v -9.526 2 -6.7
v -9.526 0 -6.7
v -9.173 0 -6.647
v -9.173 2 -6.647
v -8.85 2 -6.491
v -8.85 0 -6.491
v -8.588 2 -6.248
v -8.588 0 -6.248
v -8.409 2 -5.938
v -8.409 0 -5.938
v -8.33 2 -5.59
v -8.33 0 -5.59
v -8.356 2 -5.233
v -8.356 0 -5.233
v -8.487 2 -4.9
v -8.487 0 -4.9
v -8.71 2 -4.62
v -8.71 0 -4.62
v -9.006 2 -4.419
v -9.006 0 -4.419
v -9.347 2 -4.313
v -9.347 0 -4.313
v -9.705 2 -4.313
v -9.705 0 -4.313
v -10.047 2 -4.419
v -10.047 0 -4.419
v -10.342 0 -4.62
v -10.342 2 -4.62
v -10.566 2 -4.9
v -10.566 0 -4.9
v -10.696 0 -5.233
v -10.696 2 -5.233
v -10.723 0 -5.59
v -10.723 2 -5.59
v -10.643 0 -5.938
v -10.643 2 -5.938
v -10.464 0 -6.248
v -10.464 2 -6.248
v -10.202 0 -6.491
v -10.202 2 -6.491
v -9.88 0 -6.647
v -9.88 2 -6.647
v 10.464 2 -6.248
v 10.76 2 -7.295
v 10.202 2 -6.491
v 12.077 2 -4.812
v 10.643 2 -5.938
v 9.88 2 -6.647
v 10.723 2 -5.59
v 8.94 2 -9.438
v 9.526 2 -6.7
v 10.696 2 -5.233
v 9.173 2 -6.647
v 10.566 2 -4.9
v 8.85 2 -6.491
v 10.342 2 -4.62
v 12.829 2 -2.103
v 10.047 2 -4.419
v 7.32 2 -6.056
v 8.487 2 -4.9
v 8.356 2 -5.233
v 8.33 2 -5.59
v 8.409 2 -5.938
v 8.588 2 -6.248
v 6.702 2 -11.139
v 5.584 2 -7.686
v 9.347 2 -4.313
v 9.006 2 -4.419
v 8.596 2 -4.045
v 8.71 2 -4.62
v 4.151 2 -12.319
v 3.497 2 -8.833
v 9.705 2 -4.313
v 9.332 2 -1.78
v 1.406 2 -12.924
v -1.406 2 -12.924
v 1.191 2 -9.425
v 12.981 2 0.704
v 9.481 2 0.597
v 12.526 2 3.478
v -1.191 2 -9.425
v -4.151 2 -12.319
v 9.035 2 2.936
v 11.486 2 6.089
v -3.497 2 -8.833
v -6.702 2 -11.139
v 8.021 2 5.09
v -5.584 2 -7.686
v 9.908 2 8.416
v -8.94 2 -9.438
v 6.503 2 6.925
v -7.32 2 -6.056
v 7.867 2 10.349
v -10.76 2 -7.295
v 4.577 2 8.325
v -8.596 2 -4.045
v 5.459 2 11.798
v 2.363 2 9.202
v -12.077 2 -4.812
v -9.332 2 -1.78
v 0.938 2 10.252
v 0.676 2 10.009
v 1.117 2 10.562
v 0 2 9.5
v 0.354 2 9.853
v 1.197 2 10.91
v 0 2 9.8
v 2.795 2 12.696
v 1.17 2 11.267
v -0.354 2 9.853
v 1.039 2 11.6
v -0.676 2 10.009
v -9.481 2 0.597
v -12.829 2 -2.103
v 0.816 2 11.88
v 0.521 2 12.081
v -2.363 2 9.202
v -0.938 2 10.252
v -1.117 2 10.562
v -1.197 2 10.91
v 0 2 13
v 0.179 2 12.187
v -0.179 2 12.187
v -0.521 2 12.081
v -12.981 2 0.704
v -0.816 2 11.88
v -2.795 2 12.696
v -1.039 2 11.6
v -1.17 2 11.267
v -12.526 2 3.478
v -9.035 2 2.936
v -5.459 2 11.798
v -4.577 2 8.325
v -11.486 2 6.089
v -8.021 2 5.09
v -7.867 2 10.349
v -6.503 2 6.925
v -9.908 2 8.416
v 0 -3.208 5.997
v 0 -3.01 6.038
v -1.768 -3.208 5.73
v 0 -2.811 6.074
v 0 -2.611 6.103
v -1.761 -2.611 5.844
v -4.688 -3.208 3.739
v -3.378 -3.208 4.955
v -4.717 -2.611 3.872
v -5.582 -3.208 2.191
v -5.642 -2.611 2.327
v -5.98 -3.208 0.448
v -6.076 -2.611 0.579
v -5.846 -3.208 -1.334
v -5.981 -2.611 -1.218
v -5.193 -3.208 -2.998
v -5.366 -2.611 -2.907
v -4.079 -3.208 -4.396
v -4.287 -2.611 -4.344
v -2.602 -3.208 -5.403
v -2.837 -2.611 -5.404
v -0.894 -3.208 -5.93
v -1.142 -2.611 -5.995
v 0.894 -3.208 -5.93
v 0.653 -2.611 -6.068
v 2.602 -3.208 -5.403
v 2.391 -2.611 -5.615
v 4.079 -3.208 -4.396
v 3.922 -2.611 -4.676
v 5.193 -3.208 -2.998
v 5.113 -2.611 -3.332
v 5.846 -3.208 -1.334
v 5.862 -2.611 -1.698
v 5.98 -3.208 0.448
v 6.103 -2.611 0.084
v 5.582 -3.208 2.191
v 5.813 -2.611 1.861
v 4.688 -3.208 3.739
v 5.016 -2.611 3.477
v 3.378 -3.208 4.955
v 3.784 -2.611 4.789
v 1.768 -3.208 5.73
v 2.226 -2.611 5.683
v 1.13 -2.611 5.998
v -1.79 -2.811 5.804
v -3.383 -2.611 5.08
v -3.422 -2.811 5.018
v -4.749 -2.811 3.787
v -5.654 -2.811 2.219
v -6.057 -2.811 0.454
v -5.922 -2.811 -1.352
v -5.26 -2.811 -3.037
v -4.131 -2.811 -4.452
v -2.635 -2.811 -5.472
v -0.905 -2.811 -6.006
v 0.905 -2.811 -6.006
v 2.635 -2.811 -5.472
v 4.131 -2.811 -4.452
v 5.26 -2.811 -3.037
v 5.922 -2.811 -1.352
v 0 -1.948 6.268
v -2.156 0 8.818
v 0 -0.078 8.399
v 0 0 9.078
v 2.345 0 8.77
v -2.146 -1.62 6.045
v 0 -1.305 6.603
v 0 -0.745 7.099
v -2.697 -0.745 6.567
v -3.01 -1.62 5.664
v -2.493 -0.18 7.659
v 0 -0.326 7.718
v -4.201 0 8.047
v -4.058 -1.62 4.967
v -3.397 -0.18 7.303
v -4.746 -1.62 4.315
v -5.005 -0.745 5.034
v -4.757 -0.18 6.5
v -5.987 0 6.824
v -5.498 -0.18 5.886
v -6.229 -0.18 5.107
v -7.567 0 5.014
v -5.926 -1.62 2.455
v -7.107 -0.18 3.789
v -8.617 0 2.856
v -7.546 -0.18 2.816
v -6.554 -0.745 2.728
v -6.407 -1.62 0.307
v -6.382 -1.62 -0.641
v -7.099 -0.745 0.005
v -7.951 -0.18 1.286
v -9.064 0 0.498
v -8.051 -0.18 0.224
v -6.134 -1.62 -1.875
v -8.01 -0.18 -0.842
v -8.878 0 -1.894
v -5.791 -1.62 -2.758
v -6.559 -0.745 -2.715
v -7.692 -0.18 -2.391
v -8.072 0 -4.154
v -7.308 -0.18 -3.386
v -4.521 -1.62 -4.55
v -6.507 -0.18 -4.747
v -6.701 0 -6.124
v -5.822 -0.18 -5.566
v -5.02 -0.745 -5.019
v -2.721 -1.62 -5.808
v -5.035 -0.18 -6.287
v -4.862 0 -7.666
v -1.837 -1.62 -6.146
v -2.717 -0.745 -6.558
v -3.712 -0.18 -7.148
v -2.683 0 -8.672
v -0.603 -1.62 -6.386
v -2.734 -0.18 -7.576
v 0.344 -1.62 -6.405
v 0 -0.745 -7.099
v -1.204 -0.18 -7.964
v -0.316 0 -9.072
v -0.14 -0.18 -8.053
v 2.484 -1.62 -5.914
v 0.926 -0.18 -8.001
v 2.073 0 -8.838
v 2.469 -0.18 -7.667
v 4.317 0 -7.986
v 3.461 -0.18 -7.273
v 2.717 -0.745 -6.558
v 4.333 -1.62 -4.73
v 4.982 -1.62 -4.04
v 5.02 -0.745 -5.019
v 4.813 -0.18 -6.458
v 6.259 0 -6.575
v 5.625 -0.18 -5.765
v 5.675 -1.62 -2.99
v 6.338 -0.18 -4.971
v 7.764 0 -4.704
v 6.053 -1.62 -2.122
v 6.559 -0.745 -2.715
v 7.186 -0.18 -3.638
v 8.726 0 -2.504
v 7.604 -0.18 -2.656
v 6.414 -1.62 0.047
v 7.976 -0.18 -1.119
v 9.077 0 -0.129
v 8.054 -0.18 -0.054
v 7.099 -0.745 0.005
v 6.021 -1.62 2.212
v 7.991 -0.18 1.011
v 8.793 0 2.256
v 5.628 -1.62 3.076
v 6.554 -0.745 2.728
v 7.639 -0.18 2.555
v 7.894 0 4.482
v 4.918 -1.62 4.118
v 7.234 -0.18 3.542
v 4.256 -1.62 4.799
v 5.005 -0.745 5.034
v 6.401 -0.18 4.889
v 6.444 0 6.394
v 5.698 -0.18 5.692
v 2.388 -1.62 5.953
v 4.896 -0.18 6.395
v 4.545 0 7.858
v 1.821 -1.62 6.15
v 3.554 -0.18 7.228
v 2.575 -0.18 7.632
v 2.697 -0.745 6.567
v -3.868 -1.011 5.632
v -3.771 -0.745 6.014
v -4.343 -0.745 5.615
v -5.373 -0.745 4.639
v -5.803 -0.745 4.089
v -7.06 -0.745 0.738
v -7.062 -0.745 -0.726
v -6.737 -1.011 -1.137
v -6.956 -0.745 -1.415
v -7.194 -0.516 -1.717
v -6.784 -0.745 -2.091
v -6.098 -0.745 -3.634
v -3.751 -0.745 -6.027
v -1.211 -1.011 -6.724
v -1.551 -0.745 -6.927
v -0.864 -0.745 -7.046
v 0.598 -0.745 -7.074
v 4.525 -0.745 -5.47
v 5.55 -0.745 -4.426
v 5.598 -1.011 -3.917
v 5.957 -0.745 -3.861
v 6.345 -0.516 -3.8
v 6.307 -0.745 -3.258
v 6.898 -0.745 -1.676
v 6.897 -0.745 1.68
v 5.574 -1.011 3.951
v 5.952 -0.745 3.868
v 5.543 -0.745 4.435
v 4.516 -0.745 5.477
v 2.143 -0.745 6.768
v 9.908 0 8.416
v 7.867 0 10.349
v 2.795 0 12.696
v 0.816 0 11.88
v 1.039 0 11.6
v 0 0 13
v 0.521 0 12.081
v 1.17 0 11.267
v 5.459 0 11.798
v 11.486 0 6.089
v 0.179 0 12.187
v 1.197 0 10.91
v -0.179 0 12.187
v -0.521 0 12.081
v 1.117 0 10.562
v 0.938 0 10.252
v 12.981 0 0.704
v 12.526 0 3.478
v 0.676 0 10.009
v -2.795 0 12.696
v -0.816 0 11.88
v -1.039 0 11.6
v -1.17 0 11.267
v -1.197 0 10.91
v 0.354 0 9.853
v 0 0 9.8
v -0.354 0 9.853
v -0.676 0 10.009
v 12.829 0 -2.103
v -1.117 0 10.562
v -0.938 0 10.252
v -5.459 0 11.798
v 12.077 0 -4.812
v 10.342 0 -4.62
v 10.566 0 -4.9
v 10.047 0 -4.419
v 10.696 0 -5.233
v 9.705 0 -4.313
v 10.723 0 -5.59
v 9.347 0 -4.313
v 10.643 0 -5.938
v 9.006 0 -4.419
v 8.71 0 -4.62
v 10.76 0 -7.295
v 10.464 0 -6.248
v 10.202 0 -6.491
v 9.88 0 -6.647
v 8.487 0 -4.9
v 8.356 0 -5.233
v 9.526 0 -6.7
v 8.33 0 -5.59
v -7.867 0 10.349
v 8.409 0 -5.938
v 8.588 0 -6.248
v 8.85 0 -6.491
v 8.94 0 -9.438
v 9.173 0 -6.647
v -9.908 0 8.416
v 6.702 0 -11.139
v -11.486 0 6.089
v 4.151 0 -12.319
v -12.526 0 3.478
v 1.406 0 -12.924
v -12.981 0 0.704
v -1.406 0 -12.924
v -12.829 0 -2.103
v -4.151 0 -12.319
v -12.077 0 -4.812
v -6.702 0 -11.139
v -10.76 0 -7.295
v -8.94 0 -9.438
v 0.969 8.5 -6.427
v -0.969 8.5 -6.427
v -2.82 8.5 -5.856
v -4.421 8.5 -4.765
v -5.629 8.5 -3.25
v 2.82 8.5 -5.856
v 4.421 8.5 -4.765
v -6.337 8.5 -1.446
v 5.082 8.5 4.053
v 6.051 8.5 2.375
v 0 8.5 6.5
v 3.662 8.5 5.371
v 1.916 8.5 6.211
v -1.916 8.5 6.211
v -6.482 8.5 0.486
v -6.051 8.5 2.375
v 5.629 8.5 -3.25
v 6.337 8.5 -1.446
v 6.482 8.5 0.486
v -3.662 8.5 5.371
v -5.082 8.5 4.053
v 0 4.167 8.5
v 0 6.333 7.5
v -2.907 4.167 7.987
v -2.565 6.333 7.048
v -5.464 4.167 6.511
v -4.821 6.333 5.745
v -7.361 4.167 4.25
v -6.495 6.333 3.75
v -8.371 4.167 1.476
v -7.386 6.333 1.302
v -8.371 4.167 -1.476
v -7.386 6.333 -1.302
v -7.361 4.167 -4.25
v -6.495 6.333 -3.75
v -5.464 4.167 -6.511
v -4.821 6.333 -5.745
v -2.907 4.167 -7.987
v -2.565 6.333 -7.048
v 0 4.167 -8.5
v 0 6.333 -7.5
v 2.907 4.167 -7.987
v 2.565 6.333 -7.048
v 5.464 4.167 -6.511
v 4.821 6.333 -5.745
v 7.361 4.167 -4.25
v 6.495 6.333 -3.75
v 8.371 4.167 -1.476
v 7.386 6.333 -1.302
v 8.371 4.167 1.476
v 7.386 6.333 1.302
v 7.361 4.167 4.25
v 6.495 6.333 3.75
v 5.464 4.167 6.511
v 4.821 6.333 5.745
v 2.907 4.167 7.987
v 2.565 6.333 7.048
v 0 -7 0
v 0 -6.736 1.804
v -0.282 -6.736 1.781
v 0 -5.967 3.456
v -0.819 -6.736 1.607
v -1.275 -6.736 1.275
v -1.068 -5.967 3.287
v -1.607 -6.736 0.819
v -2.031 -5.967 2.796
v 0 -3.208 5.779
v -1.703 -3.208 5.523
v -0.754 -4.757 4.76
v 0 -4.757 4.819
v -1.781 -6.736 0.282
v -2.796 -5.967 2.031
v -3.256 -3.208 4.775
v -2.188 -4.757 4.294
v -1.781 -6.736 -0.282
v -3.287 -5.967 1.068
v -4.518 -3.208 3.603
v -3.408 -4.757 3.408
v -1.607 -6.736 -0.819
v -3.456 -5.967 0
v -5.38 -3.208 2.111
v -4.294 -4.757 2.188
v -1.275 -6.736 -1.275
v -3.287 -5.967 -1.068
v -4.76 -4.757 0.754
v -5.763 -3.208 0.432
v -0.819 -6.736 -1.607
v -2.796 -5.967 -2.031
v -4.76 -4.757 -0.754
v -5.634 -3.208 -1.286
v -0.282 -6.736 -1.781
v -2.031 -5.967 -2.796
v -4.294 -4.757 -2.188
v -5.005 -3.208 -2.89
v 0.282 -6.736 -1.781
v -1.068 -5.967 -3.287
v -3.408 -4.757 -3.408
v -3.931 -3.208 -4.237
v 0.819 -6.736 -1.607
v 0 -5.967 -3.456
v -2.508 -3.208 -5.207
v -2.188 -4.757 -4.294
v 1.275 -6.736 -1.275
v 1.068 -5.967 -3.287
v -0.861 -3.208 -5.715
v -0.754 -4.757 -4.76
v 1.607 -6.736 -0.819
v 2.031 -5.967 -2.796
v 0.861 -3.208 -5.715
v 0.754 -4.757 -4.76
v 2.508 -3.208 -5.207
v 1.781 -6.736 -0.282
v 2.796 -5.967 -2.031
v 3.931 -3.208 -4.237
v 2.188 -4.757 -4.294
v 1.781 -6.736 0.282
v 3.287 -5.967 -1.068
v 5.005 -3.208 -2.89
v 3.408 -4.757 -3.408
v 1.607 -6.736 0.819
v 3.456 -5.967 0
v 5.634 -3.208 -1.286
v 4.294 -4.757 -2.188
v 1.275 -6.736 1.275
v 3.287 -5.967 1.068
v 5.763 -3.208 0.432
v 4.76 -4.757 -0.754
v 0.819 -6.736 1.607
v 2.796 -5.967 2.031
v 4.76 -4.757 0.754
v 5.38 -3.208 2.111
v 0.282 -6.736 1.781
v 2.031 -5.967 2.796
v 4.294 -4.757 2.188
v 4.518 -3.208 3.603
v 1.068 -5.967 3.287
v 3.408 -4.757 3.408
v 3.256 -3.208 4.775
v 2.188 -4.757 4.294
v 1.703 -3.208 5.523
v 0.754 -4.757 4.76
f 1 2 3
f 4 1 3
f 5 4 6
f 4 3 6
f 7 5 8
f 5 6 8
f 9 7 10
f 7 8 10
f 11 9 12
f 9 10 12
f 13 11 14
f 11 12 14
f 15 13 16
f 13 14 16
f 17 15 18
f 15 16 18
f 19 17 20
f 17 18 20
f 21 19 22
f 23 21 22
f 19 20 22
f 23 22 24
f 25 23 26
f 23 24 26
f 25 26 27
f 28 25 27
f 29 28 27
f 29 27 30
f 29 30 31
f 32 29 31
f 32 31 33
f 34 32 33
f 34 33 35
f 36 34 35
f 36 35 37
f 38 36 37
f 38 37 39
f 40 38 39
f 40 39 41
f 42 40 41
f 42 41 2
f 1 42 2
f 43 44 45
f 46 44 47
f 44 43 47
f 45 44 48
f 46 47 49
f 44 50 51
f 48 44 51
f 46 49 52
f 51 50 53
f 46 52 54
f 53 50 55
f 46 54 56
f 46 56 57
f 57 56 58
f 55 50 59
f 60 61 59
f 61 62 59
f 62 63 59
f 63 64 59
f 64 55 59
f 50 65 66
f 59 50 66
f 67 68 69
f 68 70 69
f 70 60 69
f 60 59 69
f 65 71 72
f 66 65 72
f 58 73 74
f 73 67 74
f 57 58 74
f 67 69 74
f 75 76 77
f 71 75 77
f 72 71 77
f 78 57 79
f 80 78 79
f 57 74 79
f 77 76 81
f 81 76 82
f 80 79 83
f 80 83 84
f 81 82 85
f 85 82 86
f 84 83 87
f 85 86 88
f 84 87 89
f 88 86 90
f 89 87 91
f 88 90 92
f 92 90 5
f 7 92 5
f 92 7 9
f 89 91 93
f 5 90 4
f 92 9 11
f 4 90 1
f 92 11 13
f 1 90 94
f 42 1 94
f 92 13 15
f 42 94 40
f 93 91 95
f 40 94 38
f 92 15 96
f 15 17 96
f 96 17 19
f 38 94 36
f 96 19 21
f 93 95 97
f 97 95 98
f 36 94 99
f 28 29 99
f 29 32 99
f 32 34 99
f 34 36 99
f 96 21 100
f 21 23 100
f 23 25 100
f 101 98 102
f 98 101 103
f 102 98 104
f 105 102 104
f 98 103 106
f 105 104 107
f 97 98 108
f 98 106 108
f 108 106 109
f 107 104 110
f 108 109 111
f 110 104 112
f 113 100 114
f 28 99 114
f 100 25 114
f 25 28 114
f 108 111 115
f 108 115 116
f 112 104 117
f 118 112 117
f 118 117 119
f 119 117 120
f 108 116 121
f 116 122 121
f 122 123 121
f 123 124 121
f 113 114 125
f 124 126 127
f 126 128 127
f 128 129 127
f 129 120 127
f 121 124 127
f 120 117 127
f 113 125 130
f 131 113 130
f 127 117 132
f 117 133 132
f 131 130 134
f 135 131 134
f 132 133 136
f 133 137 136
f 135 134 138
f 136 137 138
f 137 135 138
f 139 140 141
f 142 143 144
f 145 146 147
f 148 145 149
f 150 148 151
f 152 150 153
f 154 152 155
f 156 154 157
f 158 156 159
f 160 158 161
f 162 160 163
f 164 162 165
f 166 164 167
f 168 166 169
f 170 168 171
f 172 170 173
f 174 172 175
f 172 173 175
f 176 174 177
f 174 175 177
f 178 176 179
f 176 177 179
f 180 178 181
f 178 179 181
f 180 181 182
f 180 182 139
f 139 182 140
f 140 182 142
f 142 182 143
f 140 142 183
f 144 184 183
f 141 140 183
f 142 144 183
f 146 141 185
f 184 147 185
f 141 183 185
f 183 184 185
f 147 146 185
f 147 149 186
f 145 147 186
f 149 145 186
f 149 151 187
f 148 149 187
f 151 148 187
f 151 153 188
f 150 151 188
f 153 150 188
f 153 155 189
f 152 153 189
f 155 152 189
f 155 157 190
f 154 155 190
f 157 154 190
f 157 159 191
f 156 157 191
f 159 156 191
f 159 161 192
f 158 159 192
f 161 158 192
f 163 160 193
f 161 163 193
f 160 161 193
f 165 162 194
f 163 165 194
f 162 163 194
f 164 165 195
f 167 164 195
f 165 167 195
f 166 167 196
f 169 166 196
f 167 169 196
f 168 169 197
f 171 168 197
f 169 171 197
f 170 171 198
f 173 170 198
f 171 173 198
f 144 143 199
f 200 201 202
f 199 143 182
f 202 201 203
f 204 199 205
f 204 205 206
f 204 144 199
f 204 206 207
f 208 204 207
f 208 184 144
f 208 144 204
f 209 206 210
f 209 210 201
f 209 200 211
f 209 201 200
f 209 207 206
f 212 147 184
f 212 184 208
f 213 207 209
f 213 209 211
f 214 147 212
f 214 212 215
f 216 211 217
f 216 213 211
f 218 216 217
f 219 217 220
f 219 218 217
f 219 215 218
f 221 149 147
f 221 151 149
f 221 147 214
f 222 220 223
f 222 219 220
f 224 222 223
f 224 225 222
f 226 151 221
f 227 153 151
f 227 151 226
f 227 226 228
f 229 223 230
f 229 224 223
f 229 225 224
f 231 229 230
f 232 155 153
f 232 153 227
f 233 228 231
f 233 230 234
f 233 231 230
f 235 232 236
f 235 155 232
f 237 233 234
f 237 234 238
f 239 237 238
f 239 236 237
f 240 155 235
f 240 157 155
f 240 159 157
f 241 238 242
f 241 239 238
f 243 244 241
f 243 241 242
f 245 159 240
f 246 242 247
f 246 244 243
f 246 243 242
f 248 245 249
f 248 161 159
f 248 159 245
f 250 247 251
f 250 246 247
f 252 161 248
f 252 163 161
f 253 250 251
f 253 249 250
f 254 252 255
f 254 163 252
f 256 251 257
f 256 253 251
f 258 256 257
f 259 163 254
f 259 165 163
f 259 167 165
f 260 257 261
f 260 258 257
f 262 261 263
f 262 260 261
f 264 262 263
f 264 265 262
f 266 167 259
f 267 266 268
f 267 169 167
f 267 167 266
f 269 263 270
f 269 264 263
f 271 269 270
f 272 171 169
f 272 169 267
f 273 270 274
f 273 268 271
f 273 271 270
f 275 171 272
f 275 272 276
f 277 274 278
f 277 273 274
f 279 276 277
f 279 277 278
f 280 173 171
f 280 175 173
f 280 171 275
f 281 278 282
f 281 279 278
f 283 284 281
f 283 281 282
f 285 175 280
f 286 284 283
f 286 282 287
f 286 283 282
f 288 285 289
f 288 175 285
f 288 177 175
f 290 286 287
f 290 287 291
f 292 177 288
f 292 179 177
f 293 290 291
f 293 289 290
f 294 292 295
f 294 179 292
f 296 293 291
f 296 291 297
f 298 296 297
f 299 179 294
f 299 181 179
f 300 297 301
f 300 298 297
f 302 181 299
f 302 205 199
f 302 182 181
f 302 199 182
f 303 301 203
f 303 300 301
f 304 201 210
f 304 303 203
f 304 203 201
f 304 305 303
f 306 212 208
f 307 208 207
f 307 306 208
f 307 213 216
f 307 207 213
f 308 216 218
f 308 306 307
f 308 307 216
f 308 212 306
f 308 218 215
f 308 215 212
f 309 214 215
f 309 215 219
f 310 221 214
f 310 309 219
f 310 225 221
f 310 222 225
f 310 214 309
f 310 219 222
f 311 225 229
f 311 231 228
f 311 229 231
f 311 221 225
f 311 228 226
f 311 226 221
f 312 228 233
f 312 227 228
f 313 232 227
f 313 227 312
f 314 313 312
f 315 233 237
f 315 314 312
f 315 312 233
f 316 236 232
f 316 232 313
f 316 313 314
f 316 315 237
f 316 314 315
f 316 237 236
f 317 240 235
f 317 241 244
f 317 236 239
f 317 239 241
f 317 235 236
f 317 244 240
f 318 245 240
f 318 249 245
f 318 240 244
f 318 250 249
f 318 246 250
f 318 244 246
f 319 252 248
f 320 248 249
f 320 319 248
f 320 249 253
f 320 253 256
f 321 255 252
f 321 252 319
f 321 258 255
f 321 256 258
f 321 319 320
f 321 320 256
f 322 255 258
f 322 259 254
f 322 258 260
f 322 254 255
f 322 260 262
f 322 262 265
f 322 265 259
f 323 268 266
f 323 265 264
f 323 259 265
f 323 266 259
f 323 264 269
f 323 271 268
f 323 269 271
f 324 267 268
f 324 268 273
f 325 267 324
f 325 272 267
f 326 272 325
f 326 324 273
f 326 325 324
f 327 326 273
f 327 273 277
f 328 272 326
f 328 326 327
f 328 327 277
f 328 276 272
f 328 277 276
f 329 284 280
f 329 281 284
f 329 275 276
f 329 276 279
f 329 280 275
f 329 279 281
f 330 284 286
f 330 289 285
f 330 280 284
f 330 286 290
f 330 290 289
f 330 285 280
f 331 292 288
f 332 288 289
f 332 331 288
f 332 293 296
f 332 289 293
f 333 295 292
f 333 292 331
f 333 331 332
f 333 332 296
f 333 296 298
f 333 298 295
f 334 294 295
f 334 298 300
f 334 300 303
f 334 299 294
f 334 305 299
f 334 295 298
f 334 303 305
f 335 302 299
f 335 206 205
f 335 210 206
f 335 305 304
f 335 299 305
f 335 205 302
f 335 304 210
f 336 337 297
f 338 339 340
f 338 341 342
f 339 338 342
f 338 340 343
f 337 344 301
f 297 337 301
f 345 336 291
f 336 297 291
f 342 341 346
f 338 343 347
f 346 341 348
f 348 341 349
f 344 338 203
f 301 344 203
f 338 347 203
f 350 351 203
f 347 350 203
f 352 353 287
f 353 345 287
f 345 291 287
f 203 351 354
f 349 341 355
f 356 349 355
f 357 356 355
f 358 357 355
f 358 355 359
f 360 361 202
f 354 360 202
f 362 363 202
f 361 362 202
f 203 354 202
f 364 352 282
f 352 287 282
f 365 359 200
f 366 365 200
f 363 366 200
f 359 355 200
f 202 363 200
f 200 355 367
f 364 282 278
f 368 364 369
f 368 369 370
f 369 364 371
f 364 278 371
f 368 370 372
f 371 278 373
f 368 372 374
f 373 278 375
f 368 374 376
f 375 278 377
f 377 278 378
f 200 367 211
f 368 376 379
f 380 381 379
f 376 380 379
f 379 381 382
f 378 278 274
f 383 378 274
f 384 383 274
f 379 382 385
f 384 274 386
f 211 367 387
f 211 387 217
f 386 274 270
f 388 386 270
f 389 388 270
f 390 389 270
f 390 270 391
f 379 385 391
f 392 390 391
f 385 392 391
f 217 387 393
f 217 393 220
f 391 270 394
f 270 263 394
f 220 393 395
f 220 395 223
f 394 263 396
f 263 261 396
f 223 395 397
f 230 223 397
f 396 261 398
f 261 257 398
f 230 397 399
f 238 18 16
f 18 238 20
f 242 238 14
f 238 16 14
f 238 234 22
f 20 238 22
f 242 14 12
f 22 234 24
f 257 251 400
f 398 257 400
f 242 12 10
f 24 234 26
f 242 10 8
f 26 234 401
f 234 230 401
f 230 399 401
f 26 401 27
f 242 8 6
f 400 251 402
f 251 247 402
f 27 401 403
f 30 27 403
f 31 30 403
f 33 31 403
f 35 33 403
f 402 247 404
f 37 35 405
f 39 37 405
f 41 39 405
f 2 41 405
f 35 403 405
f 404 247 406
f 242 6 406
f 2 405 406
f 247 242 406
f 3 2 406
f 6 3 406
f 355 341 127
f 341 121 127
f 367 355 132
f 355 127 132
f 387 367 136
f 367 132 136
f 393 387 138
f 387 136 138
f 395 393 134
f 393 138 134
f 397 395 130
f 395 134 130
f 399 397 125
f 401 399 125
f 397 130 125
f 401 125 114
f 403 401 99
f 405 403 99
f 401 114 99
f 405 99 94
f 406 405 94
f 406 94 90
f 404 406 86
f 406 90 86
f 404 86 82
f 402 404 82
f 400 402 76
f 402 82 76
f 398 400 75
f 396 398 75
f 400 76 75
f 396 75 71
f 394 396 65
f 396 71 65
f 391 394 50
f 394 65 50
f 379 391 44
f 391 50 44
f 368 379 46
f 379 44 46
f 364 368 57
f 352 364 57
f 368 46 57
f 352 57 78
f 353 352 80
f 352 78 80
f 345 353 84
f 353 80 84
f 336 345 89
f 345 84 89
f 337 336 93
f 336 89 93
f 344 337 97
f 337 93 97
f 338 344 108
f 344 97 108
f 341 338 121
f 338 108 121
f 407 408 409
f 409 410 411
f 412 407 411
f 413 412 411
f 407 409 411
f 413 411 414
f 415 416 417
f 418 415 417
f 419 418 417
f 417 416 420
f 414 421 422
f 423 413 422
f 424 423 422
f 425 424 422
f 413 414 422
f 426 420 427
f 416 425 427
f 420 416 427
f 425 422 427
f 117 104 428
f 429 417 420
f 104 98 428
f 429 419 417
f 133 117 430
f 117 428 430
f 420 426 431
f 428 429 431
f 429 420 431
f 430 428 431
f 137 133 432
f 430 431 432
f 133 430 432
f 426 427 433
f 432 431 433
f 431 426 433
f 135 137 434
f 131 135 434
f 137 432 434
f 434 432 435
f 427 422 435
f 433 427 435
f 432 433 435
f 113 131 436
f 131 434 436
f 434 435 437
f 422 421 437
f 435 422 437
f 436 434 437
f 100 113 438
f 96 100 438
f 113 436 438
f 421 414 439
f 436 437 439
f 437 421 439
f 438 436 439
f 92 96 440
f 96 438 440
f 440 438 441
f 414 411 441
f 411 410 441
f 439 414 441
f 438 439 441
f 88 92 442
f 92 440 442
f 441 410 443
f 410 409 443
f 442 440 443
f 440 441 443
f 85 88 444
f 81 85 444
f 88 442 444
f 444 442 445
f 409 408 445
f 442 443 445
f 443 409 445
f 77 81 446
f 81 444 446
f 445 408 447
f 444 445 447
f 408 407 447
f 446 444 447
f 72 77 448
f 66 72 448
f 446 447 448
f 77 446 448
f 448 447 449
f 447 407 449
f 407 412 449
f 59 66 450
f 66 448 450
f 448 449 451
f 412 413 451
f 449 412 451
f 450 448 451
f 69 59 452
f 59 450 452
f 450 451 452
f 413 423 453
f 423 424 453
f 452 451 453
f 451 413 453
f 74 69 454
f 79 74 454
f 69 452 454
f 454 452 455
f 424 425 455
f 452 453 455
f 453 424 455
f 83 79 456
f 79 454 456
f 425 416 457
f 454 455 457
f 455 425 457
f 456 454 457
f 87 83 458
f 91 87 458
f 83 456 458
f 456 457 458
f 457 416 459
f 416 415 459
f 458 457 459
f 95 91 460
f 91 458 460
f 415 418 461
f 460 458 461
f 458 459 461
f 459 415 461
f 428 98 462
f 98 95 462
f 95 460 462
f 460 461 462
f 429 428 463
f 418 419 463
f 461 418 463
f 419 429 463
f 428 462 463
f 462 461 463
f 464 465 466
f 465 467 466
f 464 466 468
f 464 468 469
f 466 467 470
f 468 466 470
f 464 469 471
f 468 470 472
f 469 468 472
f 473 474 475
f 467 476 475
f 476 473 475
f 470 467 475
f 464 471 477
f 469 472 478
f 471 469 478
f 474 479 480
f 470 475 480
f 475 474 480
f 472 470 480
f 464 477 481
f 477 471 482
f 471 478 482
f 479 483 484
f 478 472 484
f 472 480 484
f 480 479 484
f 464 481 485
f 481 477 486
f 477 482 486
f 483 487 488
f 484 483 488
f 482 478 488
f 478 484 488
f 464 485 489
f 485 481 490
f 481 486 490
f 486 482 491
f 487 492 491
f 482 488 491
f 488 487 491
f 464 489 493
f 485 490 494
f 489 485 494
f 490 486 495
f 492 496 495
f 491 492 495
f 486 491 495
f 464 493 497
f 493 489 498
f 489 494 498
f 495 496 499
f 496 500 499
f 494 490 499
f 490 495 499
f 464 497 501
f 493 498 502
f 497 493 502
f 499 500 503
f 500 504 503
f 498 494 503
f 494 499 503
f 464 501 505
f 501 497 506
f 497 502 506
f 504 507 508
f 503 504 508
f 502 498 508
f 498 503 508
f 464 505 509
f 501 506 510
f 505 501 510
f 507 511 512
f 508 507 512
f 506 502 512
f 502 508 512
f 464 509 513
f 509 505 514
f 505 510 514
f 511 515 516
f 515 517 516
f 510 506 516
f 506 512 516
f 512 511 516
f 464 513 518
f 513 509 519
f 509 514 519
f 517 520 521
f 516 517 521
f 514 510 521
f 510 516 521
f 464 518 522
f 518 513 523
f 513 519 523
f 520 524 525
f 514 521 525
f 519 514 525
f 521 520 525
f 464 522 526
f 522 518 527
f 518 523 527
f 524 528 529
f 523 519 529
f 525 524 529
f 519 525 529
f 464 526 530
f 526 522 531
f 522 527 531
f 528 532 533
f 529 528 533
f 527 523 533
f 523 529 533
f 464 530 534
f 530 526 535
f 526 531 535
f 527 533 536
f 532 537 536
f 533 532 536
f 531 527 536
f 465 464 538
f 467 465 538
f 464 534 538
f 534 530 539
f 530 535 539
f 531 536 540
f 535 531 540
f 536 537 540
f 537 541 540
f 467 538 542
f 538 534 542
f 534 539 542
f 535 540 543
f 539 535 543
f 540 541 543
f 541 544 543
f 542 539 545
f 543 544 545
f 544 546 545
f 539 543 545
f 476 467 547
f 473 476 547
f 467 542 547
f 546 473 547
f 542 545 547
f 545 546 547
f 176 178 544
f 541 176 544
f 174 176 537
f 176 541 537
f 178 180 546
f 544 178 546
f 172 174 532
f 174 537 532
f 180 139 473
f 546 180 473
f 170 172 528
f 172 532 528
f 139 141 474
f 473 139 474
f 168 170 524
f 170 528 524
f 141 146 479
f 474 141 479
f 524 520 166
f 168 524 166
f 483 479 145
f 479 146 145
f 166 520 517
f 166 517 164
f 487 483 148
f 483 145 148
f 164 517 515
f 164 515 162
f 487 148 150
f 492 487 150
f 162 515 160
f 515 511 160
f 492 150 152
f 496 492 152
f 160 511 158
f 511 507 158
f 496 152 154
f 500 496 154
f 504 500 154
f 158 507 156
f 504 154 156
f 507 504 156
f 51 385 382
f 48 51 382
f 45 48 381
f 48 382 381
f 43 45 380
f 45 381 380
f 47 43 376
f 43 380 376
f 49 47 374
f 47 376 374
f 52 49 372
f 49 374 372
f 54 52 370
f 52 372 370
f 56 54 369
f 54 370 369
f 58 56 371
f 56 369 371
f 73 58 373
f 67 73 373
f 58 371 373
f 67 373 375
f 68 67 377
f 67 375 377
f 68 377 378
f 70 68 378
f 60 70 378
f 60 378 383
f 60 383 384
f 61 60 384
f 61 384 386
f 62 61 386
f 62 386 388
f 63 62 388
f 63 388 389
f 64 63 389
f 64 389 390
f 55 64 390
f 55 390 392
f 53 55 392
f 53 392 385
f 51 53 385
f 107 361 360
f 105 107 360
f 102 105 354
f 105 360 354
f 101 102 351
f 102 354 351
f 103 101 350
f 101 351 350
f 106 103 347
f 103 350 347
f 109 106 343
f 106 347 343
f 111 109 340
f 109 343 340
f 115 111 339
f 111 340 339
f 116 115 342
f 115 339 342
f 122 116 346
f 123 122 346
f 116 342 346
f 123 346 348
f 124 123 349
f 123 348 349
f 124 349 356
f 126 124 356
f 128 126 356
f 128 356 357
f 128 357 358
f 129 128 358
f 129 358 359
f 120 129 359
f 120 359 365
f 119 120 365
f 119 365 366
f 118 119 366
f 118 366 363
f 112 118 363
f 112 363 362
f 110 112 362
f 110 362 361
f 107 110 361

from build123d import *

# Parameters (mm, degrees)
FILLET1_R          = 3
SKETCH2_R          = 1.2
CUT_EXTRUDE1_DEPTH = 10


with BuildPart() as part:
    # Sketch1 one side → Revolve1 (revolve)
    with BuildSketch(Plane.XY, mode=Mode.PRIVATE) as revolve1_sk:
        with BuildLine():
            Line((6.5, 8.5), (0, 8.5))
            Line((0, 8.5), (0, -7))
            ThreePointArc((0, -7), (3.456192986, -5.967326651), (5.779332516, -3.207850808))
            Line((5.779332516, -3.207850808), (5.996722799, -3.207850808))
            ThreePointArc((5.996722799, -3.207850808), (6.15577987, -1.598658708), (5.9126982, 0))
            Line((5.9126982, 0), (13, 0))
            Line((13, 0), (13, 2))
            Line((13, 2), (9.5, 2))
            Line((9.5, 2), (6.5, 8.5))
        make_face()
    revolve(revolve1_sk.sketch.rotate(Axis((0, 8.5, 0), (0, -1, 0)), 90), axis=Axis((0, 8.5, 0), (0, -1, 0)))

    # Fillet1
    fillet1_edges = [part.edges().sort_by_distance(p)[0] for p in [
        (0, 0, -5.9126982),
    ]]
    fillet(fillet1_edges, radius=FILLET1_R)

    # Sketch2 → Cut-Extrude1 (cut)
    with BuildSketch(Plane.XZ):
        with Locations(Location((0, 11, 0), (0, 0, 270))):
            Circle(SKETCH2_R)
        with Locations(Location((9.526279442, -5.5, 0), (0, 0, 270))):
            Circle(SKETCH2_R)
        with Locations(Location((-9.526279442, -5.5, 0), (0, 0, 270))):
            Circle(SKETCH2_R)
    extrude(amount=-CUT_EXTRUDE1_DEPTH, mode=Mode.SUBTRACT)


solid = part.part
